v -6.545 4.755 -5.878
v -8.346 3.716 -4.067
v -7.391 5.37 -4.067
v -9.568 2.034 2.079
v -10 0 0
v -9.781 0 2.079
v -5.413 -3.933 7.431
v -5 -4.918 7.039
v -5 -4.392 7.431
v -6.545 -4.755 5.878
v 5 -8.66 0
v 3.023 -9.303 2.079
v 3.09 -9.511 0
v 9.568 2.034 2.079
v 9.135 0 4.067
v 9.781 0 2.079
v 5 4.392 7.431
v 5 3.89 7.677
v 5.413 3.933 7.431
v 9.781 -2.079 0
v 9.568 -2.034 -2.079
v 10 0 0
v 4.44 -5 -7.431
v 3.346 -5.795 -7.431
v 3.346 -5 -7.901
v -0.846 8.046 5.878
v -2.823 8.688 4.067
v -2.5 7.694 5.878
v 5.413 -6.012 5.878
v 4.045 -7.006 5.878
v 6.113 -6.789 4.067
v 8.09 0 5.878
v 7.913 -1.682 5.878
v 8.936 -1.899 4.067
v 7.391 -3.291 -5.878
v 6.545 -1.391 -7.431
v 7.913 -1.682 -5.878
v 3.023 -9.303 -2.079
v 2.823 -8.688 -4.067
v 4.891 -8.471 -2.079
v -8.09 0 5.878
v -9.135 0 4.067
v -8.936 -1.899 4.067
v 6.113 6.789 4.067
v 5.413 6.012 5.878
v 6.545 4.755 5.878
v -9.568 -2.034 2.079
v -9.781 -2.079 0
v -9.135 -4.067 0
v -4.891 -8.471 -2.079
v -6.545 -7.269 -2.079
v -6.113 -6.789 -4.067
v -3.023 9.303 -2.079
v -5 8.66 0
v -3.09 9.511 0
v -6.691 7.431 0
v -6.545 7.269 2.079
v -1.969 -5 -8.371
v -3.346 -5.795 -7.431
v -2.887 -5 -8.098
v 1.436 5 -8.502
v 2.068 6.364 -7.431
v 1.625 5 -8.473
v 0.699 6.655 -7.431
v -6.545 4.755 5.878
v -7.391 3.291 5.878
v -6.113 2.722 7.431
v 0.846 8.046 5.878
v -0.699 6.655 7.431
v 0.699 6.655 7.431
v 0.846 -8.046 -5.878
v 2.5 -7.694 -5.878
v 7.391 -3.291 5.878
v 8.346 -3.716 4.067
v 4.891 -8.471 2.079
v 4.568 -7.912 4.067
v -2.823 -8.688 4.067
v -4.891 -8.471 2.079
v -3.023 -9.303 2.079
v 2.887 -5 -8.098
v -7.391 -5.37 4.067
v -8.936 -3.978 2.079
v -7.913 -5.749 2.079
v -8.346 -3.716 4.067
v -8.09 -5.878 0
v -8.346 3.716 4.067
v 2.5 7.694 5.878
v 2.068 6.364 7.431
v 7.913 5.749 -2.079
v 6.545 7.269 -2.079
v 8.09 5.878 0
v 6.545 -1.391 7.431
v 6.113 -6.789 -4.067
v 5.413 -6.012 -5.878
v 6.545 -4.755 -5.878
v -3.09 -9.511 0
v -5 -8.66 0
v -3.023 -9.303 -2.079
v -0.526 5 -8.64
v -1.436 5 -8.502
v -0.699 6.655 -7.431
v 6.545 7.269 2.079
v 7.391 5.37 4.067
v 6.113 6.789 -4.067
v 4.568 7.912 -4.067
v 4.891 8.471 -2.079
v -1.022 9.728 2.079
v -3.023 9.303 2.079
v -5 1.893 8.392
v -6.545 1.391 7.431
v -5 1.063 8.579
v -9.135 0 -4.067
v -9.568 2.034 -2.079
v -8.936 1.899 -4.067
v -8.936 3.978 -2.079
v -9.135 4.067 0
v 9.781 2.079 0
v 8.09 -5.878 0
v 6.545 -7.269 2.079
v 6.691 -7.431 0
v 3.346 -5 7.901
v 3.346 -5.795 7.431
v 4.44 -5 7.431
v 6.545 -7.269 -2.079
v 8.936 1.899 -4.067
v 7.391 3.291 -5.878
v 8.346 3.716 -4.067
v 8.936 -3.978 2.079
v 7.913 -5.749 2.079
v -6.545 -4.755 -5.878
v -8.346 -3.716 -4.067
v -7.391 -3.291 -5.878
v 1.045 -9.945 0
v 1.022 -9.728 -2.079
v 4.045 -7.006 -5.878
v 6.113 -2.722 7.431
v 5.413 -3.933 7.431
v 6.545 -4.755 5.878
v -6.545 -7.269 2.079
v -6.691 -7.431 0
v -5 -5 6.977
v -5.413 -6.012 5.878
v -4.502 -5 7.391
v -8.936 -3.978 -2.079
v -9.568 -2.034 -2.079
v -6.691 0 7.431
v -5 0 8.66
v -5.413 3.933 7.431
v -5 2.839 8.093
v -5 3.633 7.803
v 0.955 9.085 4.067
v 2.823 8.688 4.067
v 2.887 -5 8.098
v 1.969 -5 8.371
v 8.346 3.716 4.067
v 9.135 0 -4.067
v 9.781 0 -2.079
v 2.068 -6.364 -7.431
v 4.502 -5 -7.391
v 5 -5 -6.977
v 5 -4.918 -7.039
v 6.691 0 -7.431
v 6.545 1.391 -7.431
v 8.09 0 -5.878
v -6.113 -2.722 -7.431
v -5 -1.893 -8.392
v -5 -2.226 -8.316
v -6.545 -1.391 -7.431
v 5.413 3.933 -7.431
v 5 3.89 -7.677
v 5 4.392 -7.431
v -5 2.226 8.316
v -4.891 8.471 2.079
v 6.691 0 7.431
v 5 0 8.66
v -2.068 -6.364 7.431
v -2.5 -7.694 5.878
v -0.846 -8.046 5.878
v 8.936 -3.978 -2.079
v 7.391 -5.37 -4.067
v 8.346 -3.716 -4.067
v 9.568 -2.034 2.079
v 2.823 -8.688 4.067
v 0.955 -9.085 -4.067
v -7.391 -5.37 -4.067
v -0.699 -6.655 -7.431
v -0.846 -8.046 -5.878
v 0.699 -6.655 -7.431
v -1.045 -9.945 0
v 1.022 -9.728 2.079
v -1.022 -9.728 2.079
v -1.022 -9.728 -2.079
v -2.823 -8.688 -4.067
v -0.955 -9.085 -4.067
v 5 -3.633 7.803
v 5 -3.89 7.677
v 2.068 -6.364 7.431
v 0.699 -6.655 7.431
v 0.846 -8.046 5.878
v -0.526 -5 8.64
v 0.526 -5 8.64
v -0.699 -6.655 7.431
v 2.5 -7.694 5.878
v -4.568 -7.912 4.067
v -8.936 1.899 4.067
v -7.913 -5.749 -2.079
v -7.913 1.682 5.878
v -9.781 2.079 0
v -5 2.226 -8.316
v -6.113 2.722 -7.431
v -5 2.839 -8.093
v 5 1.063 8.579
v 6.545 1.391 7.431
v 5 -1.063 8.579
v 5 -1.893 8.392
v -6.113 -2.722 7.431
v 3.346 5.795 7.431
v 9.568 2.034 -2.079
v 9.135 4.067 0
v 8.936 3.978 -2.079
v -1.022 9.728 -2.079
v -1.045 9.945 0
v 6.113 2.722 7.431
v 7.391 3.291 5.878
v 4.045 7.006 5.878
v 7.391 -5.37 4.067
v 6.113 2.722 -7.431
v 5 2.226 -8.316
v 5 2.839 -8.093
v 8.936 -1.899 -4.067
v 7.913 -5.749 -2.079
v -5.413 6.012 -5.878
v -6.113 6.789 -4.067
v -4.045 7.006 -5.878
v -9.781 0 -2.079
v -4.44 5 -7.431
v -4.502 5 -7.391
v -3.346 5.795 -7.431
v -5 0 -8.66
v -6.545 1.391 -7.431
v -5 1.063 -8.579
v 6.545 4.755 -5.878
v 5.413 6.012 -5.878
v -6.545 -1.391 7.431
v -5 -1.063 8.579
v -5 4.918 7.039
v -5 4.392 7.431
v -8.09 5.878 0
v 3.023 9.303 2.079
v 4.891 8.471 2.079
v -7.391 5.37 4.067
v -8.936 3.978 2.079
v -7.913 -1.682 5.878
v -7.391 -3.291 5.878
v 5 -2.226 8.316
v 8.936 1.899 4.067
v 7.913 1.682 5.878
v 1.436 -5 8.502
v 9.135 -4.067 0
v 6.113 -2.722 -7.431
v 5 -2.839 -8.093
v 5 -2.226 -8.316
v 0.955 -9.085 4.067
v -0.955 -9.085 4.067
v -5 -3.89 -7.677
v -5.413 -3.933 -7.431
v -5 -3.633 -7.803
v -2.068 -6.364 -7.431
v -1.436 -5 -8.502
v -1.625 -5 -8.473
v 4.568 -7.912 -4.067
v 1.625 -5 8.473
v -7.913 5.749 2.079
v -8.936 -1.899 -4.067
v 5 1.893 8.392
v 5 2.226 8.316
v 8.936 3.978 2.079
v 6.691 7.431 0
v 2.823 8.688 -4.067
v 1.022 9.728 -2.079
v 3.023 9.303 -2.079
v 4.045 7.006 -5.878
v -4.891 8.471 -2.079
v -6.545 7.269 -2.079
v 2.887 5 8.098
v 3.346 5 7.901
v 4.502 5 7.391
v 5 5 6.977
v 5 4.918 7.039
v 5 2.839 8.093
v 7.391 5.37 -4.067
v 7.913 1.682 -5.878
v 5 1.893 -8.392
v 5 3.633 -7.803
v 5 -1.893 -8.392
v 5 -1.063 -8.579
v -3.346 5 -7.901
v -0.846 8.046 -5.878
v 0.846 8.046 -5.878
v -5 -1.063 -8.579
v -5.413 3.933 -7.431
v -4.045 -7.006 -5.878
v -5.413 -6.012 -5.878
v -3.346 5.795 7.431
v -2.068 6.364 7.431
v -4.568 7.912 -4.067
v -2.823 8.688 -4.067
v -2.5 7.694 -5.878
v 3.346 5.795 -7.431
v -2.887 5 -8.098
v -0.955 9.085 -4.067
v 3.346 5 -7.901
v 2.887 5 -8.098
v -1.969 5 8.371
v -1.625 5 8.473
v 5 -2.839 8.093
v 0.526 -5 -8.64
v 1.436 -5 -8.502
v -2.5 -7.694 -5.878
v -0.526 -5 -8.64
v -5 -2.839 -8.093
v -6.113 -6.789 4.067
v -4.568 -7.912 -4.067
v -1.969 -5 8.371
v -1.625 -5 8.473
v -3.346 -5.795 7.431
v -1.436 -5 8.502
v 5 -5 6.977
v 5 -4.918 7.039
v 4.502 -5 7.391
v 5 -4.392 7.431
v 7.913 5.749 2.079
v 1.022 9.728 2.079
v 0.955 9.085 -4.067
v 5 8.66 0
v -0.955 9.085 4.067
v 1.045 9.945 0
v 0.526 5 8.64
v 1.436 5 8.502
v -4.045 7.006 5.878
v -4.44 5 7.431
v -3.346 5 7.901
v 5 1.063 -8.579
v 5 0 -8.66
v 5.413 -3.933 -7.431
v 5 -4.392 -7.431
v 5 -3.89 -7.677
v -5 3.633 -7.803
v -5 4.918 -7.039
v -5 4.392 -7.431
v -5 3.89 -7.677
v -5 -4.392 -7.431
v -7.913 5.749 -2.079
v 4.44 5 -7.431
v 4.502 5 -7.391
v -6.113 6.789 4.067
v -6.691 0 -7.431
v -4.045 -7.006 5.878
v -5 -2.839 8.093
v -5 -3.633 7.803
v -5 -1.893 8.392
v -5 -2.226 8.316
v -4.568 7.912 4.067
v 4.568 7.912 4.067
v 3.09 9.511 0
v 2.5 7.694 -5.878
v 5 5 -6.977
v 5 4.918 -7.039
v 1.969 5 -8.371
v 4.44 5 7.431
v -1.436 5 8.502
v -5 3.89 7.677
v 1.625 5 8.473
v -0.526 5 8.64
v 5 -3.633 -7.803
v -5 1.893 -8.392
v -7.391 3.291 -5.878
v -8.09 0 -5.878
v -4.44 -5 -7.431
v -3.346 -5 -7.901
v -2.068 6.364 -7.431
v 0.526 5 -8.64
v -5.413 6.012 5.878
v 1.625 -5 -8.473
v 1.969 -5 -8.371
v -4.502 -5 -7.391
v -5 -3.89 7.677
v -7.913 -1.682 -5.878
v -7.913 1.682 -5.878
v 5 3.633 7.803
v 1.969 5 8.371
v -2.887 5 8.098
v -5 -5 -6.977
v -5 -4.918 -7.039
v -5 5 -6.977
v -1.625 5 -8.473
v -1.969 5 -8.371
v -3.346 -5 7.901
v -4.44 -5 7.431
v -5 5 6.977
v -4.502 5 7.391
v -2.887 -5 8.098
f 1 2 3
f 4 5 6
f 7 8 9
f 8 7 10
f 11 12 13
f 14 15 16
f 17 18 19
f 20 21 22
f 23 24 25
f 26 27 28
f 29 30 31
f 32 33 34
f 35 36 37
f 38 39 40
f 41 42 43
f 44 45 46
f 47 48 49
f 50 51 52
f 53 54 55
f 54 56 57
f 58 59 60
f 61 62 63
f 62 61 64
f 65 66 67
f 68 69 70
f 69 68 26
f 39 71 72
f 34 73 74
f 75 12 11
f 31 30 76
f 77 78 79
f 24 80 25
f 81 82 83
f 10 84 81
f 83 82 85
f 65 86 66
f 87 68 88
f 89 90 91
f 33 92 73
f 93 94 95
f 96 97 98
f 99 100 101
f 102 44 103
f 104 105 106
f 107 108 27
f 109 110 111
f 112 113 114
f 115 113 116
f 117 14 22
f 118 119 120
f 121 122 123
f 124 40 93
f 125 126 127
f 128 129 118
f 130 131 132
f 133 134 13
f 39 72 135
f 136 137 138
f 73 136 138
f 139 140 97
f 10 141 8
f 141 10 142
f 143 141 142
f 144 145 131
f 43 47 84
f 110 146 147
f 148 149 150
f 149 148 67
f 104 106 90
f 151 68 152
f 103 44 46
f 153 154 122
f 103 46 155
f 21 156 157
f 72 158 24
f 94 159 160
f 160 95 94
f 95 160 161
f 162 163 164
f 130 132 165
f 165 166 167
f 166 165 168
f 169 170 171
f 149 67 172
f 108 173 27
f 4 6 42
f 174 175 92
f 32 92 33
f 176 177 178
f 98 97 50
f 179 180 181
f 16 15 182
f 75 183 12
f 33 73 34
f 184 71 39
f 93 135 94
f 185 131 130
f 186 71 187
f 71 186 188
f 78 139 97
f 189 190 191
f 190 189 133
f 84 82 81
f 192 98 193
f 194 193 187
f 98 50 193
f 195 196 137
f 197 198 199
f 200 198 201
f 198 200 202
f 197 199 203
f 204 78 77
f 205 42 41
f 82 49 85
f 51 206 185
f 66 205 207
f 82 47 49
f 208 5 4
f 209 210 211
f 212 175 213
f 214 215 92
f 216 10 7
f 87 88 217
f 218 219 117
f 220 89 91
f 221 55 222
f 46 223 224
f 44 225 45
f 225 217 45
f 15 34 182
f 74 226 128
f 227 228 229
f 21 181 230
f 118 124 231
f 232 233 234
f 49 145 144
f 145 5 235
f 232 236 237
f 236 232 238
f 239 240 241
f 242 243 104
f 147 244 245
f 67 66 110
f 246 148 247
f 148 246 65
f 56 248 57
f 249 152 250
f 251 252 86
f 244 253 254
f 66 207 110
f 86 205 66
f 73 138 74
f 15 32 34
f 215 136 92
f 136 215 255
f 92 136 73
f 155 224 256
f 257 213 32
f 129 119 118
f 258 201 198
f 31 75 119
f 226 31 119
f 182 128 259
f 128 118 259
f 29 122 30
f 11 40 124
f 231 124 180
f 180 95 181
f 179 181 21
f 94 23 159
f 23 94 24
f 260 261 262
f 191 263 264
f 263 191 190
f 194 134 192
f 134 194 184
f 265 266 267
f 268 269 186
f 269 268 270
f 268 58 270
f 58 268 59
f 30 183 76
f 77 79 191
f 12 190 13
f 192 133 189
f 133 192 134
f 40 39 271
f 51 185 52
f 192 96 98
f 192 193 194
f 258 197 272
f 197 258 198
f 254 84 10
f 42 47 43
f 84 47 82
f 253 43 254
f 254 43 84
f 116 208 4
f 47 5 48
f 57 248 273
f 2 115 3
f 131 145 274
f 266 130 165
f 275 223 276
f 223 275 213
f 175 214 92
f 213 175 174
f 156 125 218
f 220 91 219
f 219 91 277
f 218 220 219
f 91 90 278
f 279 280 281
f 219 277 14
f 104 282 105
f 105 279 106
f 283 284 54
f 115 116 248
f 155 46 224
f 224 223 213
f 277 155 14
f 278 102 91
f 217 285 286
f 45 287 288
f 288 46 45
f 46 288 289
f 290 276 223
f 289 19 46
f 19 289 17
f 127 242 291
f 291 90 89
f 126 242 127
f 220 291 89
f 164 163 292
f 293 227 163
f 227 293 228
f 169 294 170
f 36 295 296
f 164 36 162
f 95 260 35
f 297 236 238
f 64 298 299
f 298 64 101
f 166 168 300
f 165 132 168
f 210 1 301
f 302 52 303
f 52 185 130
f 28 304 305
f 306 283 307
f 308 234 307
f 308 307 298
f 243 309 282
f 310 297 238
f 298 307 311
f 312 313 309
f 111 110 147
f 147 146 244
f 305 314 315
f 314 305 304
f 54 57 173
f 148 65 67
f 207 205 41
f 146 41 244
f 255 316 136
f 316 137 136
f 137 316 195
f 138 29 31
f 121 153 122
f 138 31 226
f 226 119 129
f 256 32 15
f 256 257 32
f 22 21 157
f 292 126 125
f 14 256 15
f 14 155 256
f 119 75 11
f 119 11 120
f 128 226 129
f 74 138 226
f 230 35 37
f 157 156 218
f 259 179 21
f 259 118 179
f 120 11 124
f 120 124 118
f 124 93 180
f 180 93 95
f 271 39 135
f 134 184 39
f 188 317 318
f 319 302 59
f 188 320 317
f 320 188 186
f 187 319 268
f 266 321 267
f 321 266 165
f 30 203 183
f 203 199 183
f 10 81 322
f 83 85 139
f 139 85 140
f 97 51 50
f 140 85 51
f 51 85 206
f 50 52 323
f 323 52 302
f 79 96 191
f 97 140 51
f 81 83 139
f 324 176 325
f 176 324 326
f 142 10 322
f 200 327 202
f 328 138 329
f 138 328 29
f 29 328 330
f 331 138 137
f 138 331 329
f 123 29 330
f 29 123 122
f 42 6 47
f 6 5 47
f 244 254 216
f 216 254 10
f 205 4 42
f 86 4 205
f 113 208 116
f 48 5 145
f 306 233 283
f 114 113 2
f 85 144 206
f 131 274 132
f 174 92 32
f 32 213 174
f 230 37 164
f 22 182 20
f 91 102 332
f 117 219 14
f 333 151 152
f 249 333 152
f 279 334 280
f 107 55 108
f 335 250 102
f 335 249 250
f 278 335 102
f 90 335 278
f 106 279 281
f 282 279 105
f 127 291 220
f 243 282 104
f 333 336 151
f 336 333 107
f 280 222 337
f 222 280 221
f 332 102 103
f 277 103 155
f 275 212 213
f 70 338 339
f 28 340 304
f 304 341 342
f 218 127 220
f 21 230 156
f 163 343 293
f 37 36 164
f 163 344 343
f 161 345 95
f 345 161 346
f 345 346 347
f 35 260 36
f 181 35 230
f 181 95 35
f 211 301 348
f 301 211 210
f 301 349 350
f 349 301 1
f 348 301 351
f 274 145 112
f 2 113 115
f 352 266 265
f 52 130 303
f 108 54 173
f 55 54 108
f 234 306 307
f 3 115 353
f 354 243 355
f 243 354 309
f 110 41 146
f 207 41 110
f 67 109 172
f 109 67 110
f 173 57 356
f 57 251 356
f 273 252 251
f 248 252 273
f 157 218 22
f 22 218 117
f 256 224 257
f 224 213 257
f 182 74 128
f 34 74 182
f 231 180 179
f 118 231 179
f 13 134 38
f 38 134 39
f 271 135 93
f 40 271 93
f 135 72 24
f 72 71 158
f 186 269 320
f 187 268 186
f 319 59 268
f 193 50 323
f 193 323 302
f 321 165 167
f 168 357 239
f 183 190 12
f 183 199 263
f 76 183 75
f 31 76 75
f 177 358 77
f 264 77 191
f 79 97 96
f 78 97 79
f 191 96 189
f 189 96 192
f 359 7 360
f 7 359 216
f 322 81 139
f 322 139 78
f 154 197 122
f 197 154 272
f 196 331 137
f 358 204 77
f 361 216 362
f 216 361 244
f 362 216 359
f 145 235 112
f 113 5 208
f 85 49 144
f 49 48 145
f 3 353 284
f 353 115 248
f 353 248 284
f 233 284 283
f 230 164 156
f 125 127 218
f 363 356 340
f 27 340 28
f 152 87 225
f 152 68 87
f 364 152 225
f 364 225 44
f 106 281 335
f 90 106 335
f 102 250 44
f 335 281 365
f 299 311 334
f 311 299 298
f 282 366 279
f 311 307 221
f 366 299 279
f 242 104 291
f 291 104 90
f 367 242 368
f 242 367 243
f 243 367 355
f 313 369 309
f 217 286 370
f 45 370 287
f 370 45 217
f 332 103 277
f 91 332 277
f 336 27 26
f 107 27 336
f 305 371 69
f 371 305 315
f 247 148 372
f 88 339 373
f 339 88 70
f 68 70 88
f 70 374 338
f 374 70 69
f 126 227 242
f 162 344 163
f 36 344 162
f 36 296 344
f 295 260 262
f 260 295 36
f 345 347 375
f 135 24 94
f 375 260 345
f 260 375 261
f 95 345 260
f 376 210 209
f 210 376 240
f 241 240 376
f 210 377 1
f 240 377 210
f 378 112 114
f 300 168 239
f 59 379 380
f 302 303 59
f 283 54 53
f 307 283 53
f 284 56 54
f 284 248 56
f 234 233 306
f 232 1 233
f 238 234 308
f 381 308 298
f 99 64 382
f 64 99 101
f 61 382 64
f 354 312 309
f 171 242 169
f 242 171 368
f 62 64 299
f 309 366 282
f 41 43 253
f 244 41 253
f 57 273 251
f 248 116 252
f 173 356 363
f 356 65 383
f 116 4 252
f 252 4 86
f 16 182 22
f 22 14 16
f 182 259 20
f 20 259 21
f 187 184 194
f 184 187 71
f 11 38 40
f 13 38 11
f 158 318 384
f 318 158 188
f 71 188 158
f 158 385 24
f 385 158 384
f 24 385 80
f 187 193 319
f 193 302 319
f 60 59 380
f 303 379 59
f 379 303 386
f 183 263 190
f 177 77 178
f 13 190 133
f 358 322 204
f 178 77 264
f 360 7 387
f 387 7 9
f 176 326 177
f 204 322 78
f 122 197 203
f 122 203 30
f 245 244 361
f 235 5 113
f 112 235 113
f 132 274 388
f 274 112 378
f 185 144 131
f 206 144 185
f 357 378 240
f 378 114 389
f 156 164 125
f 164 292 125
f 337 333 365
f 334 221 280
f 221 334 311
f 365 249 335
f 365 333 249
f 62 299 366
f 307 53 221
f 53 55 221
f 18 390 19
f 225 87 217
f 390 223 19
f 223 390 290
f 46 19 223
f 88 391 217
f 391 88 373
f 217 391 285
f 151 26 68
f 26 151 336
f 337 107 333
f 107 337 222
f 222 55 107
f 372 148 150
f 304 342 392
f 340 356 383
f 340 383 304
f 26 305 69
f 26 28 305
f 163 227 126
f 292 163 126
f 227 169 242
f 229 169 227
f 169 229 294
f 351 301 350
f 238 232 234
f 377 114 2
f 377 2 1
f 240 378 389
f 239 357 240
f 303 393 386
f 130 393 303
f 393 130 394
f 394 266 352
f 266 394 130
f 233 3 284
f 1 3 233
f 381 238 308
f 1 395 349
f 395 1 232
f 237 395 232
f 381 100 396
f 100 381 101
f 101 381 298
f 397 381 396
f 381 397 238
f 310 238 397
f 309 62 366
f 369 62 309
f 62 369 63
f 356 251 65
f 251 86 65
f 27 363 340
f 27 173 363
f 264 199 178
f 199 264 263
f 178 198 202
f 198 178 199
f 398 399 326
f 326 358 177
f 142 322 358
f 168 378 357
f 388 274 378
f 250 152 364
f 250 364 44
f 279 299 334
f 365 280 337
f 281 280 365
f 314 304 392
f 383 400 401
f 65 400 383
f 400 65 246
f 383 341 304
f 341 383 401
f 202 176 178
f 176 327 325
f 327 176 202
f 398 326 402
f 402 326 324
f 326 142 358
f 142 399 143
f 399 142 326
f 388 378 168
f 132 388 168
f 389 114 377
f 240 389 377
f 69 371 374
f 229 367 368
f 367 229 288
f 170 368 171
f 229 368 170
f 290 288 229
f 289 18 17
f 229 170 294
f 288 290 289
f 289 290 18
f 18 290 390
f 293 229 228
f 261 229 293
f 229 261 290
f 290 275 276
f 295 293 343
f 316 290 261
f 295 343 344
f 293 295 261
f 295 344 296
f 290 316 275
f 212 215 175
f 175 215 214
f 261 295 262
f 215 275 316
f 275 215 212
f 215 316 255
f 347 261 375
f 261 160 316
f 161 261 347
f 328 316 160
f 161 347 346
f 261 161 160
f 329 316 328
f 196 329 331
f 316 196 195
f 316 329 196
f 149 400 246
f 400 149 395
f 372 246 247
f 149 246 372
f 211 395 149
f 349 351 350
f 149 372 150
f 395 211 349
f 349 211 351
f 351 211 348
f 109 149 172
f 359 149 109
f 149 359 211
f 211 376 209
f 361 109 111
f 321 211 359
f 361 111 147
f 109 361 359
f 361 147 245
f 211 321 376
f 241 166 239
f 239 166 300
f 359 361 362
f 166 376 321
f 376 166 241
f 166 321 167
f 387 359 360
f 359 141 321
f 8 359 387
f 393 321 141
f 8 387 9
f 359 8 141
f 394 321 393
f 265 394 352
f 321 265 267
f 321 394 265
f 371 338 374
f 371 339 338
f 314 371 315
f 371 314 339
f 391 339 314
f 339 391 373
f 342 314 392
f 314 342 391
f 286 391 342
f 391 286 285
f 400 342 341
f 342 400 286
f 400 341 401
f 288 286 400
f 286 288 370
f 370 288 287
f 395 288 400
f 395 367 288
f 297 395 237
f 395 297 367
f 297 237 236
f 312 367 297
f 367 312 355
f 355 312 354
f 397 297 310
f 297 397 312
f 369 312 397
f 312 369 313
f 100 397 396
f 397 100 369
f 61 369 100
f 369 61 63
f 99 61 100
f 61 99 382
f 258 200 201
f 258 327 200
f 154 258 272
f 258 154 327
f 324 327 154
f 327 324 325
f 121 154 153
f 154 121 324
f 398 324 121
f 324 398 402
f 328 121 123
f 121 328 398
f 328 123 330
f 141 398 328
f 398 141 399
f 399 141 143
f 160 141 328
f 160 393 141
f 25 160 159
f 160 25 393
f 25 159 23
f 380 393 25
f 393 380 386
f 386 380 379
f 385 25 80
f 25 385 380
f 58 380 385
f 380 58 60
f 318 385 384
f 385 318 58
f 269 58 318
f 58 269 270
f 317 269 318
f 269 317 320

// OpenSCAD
difference() {
  sphere(10);
  translate([-5,-5,-10]) {
    cube([10,10,20]);
  }
};
